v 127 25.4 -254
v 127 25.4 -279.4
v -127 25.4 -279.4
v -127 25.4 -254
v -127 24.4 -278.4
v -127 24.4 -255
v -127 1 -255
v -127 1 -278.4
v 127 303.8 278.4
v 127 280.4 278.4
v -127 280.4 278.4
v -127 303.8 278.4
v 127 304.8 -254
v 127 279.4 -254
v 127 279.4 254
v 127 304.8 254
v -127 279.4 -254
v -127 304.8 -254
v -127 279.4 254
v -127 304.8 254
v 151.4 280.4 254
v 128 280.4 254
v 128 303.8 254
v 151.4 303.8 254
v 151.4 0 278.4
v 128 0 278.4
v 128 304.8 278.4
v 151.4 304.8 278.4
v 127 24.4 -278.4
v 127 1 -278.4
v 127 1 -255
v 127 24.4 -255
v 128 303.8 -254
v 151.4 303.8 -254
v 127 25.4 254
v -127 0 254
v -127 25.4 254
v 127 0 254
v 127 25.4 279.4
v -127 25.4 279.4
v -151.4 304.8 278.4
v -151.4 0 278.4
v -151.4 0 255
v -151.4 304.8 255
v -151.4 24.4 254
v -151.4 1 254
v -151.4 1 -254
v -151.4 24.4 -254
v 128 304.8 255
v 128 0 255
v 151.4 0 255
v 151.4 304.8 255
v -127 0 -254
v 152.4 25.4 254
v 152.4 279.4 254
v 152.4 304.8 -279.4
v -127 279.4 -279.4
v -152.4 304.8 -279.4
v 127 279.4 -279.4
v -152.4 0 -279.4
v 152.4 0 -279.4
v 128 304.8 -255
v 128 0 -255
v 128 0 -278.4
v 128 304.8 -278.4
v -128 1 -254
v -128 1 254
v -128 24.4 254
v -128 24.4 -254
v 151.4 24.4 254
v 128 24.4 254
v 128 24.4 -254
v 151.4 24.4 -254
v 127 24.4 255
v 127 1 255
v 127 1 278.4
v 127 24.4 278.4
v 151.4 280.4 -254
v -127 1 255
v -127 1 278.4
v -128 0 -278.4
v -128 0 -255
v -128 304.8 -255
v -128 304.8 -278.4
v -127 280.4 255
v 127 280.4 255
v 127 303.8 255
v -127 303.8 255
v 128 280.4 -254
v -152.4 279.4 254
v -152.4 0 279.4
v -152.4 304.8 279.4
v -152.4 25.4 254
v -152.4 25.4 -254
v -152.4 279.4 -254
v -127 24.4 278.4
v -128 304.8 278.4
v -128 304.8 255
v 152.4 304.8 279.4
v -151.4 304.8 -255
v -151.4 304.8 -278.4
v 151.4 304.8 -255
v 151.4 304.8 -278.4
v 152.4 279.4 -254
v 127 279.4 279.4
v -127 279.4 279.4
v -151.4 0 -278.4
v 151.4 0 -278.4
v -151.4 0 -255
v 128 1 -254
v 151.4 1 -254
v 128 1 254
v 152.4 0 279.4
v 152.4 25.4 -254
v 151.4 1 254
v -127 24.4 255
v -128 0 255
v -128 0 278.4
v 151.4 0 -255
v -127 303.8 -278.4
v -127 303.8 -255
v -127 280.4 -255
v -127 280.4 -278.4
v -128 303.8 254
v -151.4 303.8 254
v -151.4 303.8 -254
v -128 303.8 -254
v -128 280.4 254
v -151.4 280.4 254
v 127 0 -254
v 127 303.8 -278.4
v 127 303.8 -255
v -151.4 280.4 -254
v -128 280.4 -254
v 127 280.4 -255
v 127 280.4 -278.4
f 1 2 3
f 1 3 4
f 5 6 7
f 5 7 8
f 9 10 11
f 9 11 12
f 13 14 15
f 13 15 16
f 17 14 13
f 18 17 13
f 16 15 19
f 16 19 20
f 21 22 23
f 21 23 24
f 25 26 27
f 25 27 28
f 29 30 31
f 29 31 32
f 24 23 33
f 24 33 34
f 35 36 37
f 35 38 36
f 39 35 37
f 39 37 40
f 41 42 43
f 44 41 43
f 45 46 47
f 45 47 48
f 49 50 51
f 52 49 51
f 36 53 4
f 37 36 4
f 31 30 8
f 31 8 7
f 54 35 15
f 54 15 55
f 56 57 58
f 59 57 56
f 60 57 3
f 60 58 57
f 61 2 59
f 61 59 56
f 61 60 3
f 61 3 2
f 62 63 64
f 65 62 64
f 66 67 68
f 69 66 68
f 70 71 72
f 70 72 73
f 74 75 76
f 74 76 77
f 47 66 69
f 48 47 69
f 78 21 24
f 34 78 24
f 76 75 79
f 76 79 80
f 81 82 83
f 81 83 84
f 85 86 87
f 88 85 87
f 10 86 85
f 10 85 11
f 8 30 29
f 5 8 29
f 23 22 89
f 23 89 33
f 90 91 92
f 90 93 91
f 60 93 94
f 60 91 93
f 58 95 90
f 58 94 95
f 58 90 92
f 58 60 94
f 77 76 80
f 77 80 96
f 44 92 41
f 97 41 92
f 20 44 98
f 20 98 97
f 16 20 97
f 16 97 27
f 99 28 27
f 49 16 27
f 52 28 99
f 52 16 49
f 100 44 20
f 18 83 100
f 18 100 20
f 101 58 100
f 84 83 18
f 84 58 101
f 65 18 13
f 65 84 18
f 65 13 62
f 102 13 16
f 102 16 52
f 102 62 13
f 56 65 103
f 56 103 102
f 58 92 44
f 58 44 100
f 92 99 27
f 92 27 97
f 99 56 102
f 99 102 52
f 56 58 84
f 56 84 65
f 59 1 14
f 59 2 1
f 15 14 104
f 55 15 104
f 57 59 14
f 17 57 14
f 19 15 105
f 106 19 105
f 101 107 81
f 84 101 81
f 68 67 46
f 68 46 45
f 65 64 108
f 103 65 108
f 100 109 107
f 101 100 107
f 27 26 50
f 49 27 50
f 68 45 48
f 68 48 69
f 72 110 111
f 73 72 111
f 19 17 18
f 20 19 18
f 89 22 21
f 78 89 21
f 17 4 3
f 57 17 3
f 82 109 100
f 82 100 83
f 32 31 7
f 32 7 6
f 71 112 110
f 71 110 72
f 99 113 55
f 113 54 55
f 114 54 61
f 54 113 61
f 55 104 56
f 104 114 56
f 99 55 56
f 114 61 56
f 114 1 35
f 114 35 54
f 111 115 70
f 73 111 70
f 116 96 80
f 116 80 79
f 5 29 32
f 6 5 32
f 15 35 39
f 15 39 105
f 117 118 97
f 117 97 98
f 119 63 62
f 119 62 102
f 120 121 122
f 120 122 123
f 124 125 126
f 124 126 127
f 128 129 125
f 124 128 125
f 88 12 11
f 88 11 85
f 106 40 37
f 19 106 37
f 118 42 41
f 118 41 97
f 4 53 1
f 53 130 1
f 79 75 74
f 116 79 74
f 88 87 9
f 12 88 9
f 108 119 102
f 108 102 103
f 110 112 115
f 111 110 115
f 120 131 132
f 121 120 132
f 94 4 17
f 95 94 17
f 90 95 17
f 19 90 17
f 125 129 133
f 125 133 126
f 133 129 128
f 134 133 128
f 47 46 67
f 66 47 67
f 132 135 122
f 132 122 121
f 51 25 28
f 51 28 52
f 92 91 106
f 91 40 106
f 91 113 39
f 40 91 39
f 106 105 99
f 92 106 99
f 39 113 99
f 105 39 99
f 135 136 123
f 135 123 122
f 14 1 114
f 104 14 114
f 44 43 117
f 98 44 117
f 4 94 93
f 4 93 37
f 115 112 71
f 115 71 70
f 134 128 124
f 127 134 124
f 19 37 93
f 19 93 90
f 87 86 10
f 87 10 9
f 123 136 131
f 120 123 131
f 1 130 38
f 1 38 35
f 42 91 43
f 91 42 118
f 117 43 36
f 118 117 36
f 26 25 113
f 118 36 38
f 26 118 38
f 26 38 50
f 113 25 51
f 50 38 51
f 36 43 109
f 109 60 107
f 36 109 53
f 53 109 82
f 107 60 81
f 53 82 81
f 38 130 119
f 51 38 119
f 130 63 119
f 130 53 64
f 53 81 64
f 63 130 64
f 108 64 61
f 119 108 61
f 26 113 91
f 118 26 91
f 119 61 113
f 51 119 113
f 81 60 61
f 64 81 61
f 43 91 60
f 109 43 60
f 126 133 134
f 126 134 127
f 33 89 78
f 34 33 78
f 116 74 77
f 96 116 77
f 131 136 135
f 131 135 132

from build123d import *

# Parameters (mm, degrees)
SKETCH1_W             = 25.4
SKETCH1_H             = 25.4
SKETCH1_W_2           = 23.4
SKETCH1_H_2           = 23.4
BOSS_EXTRUDE1_DEPTH   = 304.8
BOSS_EXTRUDE1_2_DEPTH = 304.8
BOSS_EXTRUDE1_3_DEPTH = 304.8
BOSS_EXTRUDE1_4_DEPTH = 304.8
SKETCH2_W             = 25.4
SKETCH2_H             = 25.4
SKETCH2_W_2           = 23.4
SKETCH2_H_2           = 23.4
BOSS_EXTRUDE2_DEPTH   = 508
SKETCH3_W             = 25.4
SKETCH3_H             = 25.4
SKETCH3_W_2           = 23.4
SKETCH3_H_2           = 23.4
BOSS_EXTRUDE4_DEPTH   = 254
LPATTERN2_COUNT       = 2
LPATTERN2_PITCH       = 279.4


with BuildPart() as part:
    # Sketch1 → Boss-Extrude1 (new body)
    with BuildSketch(Plane(origin=(0, 0, 0), x_dir=(1, 0, 0), z_dir=(0, 1, 0))):
        with Locations((139.7, 266.7)):
            Rectangle(SKETCH1_W, SKETCH1_H)
        with Locations((139.7, 266.7)):
            Rectangle(SKETCH1_W_2, SKETCH1_H_2, mode=Mode.SUBTRACT)
    extrude(amount=BOSS_EXTRUDE1_DEPTH)



with BuildPart() as body_2:
    # Sketch1 → Boss-Extrude1 2 (new body)
    with BuildSketch(Plane(origin=(0, 0, 0), x_dir=(1, 0, 0), z_dir=(0, 1, 0))):
        with Locations((139.7, -266.7)):
            Rectangle(SKETCH1_W, SKETCH1_H)
        with Locations((139.7, -266.7)):
            Rectangle(SKETCH1_W_2, SKETCH1_H_2, mode=Mode.SUBTRACT)
    extrude(amount=BOSS_EXTRUDE1_2_DEPTH)


with BuildPart() as body_3:
    # Sketch1 → Boss-Extrude1 3 (new body)
    with BuildSketch(Plane(origin=(0, 0, 0), x_dir=(1, 0, 0), z_dir=(0, 1, 0))):
        with Locations((-139.7, -266.7)):
            Rectangle(SKETCH1_W, SKETCH1_H)
        with Locations((-139.7, -266.7)):
            Rectangle(SKETCH1_W_2, SKETCH1_H_2, mode=Mode.SUBTRACT)
    extrude(amount=BOSS_EXTRUDE1_3_DEPTH)


with BuildPart() as body_4:
    # Sketch1 → Boss-Extrude1 4 (new body)
    with BuildSketch(Plane(origin=(0, 0, 0), x_dir=(1, 0, 0), z_dir=(0, 1, 0))):
        with Locations((-139.7, 266.7)):
            Rectangle(SKETCH1_W, SKETCH1_H)
        with Locations((-139.7, 266.7)):
            Rectangle(SKETCH1_W_2, SKETCH1_H_2, mode=Mode.SUBTRACT)
    extrude(amount=BOSS_EXTRUDE1_4_DEPTH)


with BuildPart() as part_1:
    add(part.part)

    add(body_2.part)  # Boss-Extrude2 merges body 2
    # Sketch2 → Boss-Extrude2 (add)
    # profile 1 of 2: a face of its own
    with BuildSketch(Plane.XY.offset(-254)):
        with Locations((139.7, 292.1)):
            Rectangle(SKETCH2_W, SKETCH2_H)
        with Locations((139.7, 292.1)):
            Rectangle(SKETCH2_W_2, SKETCH2_H_2, mode=Mode.SUBTRACT)
    # profile 2 of 2: a face of its own
    with BuildSketch(Plane.XY.offset(-254)):
        with Locations((139.7, 12.7)):
            Rectangle(SKETCH2_W, SKETCH2_H)
        with Locations((139.7, 12.7)):
            Rectangle(SKETCH2_W_2, SKETCH2_H_2, mode=Mode.SUBTRACT)
    boss_extrude2 = extrude(amount=BOSS_EXTRUDE2_DEPTH)


    add(body_3.part)  # Boss-Extrude4 merges body 3

    add(body_4.part)  # Boss-Extrude4 merges body 4
    # Sketch3 → Boss-Extrude4 (add)
    # profile 1 of 4: a face of its own
    with BuildSketch(Plane.ZY.offset(-127)):
        with Locations((266.7, 292.1)):
            Rectangle(SKETCH3_W, SKETCH3_H)
        with Locations((266.7, 292.1)):
            Rectangle(SKETCH3_W_2, SKETCH3_H_2, mode=Mode.SUBTRACT)
    # profile 2 of 4: a face of its own
    with BuildSketch(Plane.ZY.offset(-127)):
        with Locations((-266.7, 292.1)):
            Rectangle(SKETCH3_W, SKETCH3_H)
        with Locations((-266.7, 292.1)):
            Rectangle(SKETCH3_W_2, SKETCH3_H_2, mode=Mode.SUBTRACT)
    # profile 3 of 4: a face of its own
    with BuildSketch(Plane.ZY.offset(-127)):
        with Locations((266.7, 12.7)):
            Rectangle(SKETCH3_W, SKETCH3_H)
        with Locations((266.7, 12.7)):
            Rectangle(SKETCH3_W_2, SKETCH3_H_2, mode=Mode.SUBTRACT)
    # profile 4 of 4: a face of its own
    with BuildSketch(Plane.ZY.offset(-127)):
        with Locations((-266.7, 12.7)):
            Rectangle(SKETCH3_W, SKETCH3_H)
        with Locations((-266.7, 12.7)):
            Rectangle(SKETCH3_W_2, SKETCH3_H_2, mode=Mode.SUBTRACT)
    extrude(amount=BOSS_EXTRUDE4_DEPTH)

    # LPattern2: Boss-Extrude2 ×2
    with Locations(*[(-i * LPATTERN2_PITCH, 0, 0) for i in range(1, LPATTERN2_COUNT)]):
        add(boss_extrude2)


solid = part_1.part
